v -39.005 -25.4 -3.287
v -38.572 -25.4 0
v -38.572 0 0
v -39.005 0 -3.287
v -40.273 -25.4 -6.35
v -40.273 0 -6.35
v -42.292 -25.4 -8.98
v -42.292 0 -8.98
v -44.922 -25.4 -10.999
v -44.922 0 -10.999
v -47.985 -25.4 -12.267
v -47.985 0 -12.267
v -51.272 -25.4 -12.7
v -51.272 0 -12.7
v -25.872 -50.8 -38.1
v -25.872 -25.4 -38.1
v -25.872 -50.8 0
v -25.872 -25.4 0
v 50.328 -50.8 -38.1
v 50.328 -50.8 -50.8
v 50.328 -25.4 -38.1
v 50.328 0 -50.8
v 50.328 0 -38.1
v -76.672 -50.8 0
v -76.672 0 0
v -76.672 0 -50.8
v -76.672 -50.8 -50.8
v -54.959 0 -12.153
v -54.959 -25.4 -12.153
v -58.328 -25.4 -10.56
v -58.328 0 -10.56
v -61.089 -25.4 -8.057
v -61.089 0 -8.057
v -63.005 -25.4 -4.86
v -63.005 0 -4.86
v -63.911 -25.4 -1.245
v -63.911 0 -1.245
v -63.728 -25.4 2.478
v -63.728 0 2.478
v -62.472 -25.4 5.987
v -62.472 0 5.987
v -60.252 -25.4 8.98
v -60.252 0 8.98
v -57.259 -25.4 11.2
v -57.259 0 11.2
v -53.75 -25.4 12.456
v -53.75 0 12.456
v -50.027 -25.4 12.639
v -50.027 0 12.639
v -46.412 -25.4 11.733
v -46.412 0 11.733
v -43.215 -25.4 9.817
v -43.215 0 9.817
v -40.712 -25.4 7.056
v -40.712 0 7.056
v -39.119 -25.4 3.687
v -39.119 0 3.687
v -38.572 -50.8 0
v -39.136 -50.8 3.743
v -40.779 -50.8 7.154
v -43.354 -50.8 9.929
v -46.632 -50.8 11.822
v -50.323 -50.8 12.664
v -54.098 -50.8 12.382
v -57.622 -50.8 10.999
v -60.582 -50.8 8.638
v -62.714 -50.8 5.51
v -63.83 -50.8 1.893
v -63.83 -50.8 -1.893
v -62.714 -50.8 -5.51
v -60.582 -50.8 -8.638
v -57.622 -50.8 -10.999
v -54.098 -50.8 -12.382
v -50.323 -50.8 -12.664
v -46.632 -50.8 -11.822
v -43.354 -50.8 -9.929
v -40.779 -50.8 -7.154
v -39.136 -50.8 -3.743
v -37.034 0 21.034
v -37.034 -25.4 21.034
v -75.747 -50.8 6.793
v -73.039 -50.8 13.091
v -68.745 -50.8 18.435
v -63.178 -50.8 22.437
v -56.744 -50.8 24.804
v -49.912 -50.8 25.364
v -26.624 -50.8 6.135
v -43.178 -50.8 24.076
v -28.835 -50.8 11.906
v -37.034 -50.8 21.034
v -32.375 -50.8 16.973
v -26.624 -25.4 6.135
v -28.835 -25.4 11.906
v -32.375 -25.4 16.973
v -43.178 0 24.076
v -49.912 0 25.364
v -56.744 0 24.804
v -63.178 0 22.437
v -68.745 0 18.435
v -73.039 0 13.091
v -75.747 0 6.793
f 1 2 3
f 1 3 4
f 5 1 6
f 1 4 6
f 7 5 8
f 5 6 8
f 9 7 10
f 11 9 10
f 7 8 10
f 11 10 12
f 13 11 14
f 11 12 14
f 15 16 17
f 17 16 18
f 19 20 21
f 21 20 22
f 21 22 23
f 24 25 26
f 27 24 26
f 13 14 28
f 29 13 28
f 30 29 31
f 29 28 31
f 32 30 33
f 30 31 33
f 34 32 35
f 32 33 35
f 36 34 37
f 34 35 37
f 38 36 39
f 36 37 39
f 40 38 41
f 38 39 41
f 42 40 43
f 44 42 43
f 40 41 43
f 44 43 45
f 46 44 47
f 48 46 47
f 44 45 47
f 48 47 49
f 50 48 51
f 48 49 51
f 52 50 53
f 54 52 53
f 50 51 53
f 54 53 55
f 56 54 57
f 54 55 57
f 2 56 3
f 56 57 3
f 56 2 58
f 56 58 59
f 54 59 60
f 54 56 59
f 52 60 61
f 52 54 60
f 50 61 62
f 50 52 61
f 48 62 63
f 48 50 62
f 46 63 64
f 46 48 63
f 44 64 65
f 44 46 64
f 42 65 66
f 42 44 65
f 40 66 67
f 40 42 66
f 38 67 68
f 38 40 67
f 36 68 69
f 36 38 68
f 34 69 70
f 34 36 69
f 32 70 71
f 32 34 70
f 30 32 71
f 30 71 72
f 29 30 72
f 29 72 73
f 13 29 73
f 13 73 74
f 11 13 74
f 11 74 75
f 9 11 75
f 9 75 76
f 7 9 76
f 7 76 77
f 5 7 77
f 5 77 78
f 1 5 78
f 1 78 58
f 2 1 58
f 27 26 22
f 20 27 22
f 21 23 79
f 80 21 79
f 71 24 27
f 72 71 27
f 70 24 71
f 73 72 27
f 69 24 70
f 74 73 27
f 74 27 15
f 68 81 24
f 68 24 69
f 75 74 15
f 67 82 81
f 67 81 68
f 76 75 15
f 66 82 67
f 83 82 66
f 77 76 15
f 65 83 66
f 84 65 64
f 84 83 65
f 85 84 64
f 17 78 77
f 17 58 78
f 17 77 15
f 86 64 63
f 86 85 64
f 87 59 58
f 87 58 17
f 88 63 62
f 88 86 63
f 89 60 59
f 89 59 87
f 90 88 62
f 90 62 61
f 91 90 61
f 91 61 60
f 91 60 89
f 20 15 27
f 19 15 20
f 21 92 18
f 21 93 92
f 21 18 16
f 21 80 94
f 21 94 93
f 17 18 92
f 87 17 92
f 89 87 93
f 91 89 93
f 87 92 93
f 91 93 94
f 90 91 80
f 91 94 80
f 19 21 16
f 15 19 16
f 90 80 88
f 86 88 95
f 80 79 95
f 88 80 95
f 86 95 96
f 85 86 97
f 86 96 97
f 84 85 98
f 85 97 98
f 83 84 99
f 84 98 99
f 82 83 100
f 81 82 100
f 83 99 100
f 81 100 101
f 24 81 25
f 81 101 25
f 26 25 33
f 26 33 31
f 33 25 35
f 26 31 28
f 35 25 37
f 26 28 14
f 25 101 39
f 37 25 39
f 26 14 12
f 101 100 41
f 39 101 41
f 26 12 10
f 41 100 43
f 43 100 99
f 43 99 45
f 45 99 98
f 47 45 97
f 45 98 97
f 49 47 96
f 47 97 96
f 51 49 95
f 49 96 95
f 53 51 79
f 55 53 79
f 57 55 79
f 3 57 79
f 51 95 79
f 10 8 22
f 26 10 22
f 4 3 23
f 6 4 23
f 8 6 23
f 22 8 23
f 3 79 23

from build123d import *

# Parameters (mm, degrees)
F1_DEPTH = 25.4
F2_R     = 12.7
F3_DEPTH = 25.4


with BuildPart() as f1:
    # F0 (on Front) → F1 (new body)
    with BuildSketch(Plane.XZ):
        with BuildLine():
            ThreePointArc((-37.03413, 21.034328), (-63.178262, 22.436599), (-76.672003, 0))
            ThreePointArc((-76.672003, 0), (-69.232515, -17.960512), (-51.272003, -25.4))
            ThreePointArc((-51.272003, -25.4), (-33.31149, -17.960512), (-25.872003, 0))
            ThreePointArc((-25.872003, 0), (-28.835403, 11.906259), (-37.03413, 21.034328))
        make_face()
        with BuildLine():
            ThreePointArc((-38.572003, 0), (-42.291747, -8.980256), (-51.272003, -12.7))
            ThreePointArc((-51.272003, -12.7), (-60.252259, 8.980256), (-38.572003, 0))
        make_face(mode=Mode.SUBTRACT)
        with BuildLine():
            Line((-76.672003, 0), (-76.672003, -50.8))
            Line((-76.672003, -50.8), (-51.272003, -50.8))
            Line((-51.272003, -50.8), (-51.272003, -25.4))
            ThreePointArc((-51.272003, -25.4), (-69.232515, -17.960512), (-76.672003, 0))
        make_face()
        with BuildLine():
            Line((-51.272003, -25.4), (-51.272003, -50.8))
            Line((-51.272003, -50.8), (50.327997, -50.8))
            Line((50.327997, -50.8), (50.327997, -38.1))
            Line((50.327997, -38.1), (-37.03413, 21.034328))
            ThreePointArc((-37.03413, 21.034328), (-28.835403, 11.906259), (-25.872003, 0))
            ThreePointArc((-25.872003, 0), (-33.31149, -17.960512), (-51.272003, -25.4))
        make_face()
    extrude(amount=F1_DEPTH)

    # F2 (on face) → F3 (join)
    with BuildSketch(Plane.XZ.offset(25.4)):
        with BuildLine():
            Line((50.327997, -50.8), (50.327997, -38.1))
            Line((50.327997, -38.1), (-25.872003, -38.1))
            Line((-25.872003, -38.1), (-25.872003, 0))
            ThreePointArc((-25.872003, 0), (-28.835403, 11.906259), (-37.03413, 21.034328))
            ThreePointArc((-37.03413, 21.034328), (-63.178262, 22.436599), (-76.672003, 0))
            Line((-76.672003, 0), (-76.672003, -38.1))
            Line((-76.672003, -38.1), (-76.672003, -50.8))
            Line((-76.672003, -50.8), (50.327997, -50.8))
        make_face()
        with Locations((-51.272003, 0)):
            Circle(F2_R, mode=Mode.SUBTRACT)
    extrude(amount=F3_DEPTH)


solid = f1.part
